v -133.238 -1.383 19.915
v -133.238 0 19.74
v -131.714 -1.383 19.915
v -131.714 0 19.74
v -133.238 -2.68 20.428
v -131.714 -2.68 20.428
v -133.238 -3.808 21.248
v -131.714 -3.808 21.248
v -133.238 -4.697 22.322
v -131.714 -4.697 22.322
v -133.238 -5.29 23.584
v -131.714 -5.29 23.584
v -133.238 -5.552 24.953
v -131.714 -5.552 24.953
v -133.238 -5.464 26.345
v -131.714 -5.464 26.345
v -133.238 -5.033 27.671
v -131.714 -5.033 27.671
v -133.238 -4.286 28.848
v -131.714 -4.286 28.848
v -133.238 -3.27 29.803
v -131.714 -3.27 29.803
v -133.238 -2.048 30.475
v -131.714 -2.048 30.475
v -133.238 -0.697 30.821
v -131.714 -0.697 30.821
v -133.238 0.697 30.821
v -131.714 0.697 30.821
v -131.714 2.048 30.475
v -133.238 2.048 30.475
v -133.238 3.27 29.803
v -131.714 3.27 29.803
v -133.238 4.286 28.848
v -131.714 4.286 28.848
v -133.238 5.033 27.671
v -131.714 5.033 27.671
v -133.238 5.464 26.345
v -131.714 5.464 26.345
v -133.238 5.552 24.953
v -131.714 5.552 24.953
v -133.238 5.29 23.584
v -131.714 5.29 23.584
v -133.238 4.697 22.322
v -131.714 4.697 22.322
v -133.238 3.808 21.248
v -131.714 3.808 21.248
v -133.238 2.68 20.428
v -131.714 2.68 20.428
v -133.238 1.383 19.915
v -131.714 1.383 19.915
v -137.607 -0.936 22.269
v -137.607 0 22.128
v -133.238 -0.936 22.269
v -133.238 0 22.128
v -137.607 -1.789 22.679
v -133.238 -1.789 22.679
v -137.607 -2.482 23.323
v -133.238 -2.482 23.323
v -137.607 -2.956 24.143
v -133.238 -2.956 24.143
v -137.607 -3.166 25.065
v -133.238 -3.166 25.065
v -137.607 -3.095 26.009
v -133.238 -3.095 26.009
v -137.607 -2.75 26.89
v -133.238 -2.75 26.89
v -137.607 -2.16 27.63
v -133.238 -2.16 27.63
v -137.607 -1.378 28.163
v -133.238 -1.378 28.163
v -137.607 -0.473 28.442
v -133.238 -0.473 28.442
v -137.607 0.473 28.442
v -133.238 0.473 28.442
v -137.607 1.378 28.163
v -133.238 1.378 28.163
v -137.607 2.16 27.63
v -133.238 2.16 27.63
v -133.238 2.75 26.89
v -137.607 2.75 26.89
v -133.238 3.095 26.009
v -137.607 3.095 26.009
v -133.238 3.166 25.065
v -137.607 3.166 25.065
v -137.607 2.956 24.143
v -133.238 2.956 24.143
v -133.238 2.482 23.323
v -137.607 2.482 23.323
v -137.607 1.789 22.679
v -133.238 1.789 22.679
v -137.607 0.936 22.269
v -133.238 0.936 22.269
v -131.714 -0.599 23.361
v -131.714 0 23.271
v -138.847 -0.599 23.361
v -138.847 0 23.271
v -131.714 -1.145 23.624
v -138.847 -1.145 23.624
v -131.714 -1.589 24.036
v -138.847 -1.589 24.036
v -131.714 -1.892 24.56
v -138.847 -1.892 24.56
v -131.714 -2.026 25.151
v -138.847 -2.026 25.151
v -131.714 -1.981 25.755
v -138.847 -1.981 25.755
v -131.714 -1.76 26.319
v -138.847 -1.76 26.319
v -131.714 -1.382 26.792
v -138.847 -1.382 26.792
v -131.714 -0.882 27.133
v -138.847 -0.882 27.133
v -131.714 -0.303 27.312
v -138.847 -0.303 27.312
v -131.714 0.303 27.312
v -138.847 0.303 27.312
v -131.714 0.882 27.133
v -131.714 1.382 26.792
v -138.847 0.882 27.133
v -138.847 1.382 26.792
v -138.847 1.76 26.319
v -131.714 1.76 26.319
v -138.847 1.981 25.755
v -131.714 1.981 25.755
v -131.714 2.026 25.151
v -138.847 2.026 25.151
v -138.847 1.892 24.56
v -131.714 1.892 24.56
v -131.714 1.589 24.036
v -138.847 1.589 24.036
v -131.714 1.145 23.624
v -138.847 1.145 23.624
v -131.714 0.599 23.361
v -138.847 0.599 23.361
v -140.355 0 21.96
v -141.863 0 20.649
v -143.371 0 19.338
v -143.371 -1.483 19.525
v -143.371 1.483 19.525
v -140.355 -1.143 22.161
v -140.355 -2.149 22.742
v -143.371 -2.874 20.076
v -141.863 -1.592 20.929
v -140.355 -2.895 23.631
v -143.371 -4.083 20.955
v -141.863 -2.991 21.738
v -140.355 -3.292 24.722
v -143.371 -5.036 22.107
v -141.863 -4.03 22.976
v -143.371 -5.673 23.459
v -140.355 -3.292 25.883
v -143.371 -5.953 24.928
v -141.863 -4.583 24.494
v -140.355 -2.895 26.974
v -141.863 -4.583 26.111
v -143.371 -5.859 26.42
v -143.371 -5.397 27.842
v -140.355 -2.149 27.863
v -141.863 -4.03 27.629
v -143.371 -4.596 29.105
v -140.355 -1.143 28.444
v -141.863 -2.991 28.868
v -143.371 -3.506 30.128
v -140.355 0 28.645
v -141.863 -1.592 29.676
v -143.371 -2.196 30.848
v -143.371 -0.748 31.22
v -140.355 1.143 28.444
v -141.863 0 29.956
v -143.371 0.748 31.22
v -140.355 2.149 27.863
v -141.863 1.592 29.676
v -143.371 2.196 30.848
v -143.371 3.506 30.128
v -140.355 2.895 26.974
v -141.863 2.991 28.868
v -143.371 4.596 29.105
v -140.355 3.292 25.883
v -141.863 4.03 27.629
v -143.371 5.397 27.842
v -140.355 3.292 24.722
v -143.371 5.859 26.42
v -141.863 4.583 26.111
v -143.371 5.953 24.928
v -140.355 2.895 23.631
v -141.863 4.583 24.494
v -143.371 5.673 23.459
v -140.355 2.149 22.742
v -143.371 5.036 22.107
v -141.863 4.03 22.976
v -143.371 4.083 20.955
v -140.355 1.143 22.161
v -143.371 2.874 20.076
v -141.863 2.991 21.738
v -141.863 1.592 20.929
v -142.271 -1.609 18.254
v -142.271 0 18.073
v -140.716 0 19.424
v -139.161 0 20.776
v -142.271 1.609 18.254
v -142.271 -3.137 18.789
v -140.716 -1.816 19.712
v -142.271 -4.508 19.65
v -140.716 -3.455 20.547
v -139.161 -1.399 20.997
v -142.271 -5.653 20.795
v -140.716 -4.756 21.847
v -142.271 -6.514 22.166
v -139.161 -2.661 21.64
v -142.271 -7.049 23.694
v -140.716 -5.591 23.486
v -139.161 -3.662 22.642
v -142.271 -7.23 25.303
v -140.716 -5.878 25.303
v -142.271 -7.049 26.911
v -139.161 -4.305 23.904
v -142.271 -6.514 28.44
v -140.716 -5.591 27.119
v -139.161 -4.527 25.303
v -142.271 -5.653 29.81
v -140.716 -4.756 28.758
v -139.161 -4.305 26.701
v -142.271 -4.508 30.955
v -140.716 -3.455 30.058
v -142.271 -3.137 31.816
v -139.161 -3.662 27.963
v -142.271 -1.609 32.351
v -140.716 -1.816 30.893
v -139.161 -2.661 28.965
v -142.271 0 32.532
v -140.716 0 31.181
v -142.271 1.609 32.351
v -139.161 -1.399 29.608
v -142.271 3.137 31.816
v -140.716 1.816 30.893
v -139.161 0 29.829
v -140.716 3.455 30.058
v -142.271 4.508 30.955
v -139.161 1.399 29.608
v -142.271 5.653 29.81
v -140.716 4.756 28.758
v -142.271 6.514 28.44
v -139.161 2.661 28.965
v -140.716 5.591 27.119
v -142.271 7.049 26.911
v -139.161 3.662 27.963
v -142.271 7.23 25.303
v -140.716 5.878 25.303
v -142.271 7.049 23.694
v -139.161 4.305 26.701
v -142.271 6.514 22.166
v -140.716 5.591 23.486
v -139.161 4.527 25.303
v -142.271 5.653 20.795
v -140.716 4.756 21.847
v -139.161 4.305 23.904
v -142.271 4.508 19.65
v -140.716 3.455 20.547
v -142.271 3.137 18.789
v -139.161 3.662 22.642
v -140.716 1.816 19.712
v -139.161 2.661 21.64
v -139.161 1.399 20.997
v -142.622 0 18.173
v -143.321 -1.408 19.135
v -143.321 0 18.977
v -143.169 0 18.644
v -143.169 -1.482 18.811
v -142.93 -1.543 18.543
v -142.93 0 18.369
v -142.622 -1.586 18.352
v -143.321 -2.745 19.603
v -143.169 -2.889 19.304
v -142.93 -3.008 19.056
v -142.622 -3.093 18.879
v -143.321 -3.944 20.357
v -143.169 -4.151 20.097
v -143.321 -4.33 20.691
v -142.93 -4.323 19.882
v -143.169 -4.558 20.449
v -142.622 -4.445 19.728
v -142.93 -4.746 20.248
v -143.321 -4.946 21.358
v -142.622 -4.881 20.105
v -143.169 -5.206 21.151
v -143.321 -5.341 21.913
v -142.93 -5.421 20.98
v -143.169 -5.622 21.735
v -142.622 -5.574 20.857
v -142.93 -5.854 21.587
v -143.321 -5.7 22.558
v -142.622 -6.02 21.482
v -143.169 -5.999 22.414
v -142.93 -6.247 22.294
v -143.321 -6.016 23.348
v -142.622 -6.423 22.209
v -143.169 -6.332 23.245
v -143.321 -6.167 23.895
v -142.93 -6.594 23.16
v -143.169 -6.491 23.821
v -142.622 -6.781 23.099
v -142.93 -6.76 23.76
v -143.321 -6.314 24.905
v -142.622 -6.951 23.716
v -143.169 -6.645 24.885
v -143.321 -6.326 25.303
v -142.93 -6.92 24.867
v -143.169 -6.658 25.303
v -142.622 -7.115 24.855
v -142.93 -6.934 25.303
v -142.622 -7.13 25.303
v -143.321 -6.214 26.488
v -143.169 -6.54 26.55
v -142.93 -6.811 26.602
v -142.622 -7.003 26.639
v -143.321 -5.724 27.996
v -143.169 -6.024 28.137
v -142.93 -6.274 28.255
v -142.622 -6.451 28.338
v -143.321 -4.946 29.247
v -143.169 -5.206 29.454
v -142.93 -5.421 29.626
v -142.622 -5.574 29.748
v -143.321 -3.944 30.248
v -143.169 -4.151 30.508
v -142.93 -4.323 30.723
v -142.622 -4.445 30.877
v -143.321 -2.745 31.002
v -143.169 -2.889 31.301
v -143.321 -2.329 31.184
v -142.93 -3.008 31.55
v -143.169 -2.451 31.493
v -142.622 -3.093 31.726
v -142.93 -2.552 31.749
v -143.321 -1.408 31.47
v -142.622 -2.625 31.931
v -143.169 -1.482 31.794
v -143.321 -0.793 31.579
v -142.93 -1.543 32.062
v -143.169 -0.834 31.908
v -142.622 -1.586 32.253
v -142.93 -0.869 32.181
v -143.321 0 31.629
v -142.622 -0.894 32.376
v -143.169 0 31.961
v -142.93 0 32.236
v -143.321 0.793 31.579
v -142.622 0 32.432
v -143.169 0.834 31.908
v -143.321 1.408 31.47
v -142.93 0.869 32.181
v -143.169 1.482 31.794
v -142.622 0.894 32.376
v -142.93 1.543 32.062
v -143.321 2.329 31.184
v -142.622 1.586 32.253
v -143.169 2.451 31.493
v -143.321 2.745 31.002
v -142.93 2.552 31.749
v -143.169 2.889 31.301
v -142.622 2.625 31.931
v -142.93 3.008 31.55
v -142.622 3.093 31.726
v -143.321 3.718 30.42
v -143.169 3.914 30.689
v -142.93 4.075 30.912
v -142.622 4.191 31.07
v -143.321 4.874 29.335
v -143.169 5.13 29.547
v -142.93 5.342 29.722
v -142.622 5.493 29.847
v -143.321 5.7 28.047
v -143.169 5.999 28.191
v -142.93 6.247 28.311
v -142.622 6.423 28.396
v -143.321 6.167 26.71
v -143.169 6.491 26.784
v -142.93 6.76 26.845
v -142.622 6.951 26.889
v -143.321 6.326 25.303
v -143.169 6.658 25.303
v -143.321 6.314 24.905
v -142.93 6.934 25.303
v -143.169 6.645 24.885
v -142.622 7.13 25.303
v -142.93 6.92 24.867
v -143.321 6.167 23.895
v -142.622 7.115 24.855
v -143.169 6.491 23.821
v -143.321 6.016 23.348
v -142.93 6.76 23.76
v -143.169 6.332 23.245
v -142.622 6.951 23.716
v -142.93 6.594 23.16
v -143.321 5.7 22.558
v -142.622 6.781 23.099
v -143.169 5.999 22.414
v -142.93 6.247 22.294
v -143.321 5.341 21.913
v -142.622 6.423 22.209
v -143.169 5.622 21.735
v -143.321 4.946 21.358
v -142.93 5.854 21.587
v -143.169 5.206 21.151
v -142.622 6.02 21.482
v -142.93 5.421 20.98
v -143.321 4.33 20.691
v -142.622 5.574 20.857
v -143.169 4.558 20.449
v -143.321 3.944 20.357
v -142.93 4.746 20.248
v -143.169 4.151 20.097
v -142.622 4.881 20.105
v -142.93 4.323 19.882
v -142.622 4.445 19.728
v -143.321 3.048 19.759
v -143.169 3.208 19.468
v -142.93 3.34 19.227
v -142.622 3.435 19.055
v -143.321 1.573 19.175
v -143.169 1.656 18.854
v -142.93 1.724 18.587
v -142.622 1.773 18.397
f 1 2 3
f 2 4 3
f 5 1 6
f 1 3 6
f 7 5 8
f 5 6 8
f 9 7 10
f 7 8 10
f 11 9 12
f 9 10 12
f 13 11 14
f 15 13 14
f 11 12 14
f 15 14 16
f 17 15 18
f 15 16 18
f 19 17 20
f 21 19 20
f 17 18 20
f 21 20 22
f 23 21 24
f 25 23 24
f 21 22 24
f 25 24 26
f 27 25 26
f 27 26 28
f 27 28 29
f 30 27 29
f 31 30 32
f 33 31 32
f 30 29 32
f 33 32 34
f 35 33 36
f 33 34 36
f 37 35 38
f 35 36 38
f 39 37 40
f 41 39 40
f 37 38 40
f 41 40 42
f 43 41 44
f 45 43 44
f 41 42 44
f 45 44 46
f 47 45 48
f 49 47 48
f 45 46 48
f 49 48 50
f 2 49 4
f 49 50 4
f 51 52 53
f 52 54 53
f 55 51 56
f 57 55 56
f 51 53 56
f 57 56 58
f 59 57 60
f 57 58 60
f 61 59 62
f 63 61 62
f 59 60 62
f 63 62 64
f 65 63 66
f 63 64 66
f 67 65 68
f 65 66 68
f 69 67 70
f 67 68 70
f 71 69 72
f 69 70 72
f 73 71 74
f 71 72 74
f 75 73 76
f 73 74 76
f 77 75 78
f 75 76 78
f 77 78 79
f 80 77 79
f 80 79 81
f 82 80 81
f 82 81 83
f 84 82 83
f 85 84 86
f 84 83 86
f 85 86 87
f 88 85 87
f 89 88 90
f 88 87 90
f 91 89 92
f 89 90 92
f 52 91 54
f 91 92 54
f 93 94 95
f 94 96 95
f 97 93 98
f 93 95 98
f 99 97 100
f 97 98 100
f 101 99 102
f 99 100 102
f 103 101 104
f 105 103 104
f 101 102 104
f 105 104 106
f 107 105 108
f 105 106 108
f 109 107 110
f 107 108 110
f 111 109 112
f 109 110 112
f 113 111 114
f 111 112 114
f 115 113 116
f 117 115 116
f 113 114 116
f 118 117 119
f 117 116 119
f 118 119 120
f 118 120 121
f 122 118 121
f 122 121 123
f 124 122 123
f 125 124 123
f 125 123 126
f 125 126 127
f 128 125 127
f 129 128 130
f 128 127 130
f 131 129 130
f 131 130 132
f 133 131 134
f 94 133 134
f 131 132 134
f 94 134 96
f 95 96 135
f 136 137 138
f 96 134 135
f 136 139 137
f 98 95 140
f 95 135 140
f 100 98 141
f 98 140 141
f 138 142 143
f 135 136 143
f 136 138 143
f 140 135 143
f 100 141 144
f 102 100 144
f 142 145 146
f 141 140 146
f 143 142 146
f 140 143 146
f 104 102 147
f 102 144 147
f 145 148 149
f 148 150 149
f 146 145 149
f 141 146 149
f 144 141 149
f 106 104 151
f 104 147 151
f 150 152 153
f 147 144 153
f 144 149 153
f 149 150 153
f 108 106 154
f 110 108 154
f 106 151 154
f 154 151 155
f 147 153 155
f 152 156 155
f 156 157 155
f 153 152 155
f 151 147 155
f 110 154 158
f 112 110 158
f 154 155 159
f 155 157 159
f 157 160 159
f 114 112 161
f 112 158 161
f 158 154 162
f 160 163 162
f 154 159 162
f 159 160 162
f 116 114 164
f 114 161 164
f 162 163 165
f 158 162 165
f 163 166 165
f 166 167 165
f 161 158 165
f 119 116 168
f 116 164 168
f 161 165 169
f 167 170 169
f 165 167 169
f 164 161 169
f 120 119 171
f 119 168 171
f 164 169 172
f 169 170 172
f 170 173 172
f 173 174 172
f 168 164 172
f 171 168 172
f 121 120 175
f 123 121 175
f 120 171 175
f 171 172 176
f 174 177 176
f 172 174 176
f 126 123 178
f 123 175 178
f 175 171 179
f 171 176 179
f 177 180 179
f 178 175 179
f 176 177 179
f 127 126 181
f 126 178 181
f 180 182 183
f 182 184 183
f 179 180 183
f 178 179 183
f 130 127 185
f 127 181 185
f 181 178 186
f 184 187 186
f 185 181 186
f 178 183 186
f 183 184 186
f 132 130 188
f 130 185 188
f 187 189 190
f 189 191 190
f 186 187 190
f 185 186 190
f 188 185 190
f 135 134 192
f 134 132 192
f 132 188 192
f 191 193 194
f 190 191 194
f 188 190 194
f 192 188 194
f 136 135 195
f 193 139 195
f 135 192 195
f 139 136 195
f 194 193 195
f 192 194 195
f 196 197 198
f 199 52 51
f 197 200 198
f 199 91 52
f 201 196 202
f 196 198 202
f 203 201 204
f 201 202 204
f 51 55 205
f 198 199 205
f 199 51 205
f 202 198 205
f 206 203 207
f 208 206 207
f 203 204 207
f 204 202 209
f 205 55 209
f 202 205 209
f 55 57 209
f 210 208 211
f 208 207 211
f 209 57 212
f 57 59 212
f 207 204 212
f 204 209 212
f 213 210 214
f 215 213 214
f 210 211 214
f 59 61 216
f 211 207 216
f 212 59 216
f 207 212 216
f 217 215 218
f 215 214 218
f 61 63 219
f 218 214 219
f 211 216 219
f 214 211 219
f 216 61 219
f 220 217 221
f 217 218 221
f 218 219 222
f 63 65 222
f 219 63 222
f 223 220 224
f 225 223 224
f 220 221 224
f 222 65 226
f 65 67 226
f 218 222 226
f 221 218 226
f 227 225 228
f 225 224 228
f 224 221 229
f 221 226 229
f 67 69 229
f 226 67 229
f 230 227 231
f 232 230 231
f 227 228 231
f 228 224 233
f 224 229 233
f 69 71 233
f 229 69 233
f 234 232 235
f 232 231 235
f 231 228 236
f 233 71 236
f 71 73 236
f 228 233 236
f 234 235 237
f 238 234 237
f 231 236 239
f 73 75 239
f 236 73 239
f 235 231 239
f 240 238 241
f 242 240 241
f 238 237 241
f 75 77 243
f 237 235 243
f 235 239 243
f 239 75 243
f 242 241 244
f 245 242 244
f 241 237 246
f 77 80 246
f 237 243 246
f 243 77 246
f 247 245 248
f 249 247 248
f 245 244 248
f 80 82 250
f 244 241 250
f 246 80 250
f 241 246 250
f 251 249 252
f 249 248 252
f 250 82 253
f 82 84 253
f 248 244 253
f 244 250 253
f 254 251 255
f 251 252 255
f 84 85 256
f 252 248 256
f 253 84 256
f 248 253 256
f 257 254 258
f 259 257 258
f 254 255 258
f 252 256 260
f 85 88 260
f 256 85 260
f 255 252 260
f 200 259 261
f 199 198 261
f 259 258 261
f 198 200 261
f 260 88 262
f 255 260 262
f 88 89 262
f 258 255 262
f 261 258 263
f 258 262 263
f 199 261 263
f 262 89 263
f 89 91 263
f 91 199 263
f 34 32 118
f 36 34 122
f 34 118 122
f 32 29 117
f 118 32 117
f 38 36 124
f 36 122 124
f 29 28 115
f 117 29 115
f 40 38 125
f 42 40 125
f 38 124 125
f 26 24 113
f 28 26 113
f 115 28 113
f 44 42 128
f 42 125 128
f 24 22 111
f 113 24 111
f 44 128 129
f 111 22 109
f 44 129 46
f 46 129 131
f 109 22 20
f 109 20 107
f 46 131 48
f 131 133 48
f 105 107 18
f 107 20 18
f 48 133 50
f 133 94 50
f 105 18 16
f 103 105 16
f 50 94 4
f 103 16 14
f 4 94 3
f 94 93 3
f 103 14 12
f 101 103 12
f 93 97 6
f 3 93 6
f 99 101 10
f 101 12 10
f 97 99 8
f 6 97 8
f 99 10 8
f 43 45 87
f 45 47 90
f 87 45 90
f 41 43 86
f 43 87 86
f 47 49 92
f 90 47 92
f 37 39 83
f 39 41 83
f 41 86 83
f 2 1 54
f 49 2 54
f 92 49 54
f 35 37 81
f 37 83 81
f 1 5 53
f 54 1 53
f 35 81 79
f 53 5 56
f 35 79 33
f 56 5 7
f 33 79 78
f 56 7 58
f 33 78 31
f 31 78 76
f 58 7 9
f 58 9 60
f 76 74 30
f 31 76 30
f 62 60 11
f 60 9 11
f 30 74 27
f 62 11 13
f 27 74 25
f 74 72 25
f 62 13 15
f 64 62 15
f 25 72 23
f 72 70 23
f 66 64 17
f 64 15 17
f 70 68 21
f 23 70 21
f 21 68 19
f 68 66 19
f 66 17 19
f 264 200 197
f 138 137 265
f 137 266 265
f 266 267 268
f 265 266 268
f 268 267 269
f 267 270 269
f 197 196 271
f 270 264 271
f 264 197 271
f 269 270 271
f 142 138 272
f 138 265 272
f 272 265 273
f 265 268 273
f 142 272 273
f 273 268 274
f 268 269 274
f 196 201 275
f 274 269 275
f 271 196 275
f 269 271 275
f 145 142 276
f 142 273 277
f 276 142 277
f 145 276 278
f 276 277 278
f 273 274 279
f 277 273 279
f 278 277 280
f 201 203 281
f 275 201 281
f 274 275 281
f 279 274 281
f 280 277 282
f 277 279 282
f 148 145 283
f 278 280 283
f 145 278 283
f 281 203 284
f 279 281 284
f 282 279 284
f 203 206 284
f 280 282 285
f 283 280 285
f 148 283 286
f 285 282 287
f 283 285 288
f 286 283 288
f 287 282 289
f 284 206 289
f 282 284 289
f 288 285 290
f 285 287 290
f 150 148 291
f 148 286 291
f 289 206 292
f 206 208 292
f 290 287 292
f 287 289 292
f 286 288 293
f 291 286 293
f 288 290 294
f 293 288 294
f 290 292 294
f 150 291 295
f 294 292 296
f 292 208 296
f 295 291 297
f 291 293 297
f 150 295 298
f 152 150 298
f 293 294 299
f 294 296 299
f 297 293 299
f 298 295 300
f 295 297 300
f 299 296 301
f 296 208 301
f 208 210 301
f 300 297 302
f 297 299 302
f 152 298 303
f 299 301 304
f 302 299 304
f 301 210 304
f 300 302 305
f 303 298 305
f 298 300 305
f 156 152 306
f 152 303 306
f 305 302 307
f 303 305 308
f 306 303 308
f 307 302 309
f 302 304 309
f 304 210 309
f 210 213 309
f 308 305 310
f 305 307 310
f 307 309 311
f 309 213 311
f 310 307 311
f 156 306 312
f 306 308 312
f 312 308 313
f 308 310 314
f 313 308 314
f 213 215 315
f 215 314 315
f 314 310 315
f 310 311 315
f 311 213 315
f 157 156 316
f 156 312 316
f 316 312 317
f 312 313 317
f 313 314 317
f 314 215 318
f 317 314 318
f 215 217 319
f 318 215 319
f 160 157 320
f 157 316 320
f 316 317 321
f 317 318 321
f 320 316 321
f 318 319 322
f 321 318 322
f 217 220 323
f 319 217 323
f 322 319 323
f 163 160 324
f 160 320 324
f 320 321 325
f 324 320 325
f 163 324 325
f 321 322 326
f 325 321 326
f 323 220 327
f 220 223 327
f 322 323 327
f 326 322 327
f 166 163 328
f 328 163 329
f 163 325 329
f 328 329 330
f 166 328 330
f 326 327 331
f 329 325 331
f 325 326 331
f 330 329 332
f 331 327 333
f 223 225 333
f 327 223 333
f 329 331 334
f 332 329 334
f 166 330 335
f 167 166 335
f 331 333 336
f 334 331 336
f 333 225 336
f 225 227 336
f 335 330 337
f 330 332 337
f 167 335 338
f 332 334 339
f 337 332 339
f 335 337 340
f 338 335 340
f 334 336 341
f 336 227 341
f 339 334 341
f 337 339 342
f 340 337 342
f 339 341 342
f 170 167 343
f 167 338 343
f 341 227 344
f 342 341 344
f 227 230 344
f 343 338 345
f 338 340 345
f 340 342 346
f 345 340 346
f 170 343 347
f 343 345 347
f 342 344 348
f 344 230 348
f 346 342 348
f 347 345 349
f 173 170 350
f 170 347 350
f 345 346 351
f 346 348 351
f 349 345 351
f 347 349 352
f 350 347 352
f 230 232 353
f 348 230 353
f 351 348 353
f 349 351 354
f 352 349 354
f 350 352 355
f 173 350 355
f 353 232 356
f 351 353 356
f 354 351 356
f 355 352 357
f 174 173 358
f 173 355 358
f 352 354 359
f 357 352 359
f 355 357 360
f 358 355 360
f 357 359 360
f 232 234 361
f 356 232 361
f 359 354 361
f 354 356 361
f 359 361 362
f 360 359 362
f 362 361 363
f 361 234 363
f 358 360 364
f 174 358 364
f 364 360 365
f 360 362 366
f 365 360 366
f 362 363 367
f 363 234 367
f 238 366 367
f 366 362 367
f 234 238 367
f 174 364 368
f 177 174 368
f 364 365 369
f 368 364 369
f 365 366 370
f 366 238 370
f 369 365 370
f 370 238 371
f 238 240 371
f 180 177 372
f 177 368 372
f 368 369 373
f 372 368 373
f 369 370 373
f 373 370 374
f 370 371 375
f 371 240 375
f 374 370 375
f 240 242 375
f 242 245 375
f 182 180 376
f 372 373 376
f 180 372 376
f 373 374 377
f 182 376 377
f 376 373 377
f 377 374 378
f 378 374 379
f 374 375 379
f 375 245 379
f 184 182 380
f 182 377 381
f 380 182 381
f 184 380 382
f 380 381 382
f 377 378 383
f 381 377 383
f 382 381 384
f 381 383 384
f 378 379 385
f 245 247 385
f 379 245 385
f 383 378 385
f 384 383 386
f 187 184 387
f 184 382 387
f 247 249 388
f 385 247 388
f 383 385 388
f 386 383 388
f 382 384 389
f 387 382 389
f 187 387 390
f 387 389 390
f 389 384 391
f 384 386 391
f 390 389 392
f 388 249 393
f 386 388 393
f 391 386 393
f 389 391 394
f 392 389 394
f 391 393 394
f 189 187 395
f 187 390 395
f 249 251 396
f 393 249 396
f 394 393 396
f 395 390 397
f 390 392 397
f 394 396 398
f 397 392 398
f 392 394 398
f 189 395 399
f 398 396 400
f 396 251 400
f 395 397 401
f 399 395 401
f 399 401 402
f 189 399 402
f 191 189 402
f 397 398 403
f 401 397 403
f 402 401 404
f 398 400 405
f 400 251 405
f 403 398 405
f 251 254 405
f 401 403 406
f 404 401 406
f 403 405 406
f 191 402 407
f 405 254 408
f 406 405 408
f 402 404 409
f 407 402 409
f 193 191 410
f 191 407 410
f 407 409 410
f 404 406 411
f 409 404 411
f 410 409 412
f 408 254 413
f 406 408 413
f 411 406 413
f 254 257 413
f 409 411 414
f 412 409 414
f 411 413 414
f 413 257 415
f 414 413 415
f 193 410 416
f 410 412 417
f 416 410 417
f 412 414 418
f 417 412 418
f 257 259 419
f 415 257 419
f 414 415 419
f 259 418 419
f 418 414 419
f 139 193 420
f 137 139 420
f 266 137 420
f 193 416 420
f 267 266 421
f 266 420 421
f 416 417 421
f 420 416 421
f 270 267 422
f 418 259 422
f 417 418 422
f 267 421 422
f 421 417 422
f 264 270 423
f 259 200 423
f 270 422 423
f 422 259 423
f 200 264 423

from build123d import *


with BuildPart() as f1:
    # F0 (on Front) → F1 (revolve)
    with BuildSketch(Plane.XZ):
        with BuildLine():
            Line((-131.713825, 19.739976), (-131.713825, 23.270576))
            Line((-131.713825, 23.270576), (-138.847012, 23.270576))
            Line((-138.847012, 23.270576), (-143.371043, 19.337896))
            ThreePointArc((-143.371043, 19.337896), (-143.059541, 18.498054), (-142.271226, 18.072701))
            Line((-142.271226, 18.072701), (-137.606625, 22.127576))
            Line((-137.606625, 22.127576), (-133.237825, 22.127576))
            Line((-133.237825, 22.127576), (-133.237825, 19.739976))
            Line((-133.237825, 19.739976), (-131.713825, 19.739976))
        make_face()
    revolve(axis=Axis((-144.413825, 0, 25.302576), (-1, 0, 0)))


solid = f1.part
